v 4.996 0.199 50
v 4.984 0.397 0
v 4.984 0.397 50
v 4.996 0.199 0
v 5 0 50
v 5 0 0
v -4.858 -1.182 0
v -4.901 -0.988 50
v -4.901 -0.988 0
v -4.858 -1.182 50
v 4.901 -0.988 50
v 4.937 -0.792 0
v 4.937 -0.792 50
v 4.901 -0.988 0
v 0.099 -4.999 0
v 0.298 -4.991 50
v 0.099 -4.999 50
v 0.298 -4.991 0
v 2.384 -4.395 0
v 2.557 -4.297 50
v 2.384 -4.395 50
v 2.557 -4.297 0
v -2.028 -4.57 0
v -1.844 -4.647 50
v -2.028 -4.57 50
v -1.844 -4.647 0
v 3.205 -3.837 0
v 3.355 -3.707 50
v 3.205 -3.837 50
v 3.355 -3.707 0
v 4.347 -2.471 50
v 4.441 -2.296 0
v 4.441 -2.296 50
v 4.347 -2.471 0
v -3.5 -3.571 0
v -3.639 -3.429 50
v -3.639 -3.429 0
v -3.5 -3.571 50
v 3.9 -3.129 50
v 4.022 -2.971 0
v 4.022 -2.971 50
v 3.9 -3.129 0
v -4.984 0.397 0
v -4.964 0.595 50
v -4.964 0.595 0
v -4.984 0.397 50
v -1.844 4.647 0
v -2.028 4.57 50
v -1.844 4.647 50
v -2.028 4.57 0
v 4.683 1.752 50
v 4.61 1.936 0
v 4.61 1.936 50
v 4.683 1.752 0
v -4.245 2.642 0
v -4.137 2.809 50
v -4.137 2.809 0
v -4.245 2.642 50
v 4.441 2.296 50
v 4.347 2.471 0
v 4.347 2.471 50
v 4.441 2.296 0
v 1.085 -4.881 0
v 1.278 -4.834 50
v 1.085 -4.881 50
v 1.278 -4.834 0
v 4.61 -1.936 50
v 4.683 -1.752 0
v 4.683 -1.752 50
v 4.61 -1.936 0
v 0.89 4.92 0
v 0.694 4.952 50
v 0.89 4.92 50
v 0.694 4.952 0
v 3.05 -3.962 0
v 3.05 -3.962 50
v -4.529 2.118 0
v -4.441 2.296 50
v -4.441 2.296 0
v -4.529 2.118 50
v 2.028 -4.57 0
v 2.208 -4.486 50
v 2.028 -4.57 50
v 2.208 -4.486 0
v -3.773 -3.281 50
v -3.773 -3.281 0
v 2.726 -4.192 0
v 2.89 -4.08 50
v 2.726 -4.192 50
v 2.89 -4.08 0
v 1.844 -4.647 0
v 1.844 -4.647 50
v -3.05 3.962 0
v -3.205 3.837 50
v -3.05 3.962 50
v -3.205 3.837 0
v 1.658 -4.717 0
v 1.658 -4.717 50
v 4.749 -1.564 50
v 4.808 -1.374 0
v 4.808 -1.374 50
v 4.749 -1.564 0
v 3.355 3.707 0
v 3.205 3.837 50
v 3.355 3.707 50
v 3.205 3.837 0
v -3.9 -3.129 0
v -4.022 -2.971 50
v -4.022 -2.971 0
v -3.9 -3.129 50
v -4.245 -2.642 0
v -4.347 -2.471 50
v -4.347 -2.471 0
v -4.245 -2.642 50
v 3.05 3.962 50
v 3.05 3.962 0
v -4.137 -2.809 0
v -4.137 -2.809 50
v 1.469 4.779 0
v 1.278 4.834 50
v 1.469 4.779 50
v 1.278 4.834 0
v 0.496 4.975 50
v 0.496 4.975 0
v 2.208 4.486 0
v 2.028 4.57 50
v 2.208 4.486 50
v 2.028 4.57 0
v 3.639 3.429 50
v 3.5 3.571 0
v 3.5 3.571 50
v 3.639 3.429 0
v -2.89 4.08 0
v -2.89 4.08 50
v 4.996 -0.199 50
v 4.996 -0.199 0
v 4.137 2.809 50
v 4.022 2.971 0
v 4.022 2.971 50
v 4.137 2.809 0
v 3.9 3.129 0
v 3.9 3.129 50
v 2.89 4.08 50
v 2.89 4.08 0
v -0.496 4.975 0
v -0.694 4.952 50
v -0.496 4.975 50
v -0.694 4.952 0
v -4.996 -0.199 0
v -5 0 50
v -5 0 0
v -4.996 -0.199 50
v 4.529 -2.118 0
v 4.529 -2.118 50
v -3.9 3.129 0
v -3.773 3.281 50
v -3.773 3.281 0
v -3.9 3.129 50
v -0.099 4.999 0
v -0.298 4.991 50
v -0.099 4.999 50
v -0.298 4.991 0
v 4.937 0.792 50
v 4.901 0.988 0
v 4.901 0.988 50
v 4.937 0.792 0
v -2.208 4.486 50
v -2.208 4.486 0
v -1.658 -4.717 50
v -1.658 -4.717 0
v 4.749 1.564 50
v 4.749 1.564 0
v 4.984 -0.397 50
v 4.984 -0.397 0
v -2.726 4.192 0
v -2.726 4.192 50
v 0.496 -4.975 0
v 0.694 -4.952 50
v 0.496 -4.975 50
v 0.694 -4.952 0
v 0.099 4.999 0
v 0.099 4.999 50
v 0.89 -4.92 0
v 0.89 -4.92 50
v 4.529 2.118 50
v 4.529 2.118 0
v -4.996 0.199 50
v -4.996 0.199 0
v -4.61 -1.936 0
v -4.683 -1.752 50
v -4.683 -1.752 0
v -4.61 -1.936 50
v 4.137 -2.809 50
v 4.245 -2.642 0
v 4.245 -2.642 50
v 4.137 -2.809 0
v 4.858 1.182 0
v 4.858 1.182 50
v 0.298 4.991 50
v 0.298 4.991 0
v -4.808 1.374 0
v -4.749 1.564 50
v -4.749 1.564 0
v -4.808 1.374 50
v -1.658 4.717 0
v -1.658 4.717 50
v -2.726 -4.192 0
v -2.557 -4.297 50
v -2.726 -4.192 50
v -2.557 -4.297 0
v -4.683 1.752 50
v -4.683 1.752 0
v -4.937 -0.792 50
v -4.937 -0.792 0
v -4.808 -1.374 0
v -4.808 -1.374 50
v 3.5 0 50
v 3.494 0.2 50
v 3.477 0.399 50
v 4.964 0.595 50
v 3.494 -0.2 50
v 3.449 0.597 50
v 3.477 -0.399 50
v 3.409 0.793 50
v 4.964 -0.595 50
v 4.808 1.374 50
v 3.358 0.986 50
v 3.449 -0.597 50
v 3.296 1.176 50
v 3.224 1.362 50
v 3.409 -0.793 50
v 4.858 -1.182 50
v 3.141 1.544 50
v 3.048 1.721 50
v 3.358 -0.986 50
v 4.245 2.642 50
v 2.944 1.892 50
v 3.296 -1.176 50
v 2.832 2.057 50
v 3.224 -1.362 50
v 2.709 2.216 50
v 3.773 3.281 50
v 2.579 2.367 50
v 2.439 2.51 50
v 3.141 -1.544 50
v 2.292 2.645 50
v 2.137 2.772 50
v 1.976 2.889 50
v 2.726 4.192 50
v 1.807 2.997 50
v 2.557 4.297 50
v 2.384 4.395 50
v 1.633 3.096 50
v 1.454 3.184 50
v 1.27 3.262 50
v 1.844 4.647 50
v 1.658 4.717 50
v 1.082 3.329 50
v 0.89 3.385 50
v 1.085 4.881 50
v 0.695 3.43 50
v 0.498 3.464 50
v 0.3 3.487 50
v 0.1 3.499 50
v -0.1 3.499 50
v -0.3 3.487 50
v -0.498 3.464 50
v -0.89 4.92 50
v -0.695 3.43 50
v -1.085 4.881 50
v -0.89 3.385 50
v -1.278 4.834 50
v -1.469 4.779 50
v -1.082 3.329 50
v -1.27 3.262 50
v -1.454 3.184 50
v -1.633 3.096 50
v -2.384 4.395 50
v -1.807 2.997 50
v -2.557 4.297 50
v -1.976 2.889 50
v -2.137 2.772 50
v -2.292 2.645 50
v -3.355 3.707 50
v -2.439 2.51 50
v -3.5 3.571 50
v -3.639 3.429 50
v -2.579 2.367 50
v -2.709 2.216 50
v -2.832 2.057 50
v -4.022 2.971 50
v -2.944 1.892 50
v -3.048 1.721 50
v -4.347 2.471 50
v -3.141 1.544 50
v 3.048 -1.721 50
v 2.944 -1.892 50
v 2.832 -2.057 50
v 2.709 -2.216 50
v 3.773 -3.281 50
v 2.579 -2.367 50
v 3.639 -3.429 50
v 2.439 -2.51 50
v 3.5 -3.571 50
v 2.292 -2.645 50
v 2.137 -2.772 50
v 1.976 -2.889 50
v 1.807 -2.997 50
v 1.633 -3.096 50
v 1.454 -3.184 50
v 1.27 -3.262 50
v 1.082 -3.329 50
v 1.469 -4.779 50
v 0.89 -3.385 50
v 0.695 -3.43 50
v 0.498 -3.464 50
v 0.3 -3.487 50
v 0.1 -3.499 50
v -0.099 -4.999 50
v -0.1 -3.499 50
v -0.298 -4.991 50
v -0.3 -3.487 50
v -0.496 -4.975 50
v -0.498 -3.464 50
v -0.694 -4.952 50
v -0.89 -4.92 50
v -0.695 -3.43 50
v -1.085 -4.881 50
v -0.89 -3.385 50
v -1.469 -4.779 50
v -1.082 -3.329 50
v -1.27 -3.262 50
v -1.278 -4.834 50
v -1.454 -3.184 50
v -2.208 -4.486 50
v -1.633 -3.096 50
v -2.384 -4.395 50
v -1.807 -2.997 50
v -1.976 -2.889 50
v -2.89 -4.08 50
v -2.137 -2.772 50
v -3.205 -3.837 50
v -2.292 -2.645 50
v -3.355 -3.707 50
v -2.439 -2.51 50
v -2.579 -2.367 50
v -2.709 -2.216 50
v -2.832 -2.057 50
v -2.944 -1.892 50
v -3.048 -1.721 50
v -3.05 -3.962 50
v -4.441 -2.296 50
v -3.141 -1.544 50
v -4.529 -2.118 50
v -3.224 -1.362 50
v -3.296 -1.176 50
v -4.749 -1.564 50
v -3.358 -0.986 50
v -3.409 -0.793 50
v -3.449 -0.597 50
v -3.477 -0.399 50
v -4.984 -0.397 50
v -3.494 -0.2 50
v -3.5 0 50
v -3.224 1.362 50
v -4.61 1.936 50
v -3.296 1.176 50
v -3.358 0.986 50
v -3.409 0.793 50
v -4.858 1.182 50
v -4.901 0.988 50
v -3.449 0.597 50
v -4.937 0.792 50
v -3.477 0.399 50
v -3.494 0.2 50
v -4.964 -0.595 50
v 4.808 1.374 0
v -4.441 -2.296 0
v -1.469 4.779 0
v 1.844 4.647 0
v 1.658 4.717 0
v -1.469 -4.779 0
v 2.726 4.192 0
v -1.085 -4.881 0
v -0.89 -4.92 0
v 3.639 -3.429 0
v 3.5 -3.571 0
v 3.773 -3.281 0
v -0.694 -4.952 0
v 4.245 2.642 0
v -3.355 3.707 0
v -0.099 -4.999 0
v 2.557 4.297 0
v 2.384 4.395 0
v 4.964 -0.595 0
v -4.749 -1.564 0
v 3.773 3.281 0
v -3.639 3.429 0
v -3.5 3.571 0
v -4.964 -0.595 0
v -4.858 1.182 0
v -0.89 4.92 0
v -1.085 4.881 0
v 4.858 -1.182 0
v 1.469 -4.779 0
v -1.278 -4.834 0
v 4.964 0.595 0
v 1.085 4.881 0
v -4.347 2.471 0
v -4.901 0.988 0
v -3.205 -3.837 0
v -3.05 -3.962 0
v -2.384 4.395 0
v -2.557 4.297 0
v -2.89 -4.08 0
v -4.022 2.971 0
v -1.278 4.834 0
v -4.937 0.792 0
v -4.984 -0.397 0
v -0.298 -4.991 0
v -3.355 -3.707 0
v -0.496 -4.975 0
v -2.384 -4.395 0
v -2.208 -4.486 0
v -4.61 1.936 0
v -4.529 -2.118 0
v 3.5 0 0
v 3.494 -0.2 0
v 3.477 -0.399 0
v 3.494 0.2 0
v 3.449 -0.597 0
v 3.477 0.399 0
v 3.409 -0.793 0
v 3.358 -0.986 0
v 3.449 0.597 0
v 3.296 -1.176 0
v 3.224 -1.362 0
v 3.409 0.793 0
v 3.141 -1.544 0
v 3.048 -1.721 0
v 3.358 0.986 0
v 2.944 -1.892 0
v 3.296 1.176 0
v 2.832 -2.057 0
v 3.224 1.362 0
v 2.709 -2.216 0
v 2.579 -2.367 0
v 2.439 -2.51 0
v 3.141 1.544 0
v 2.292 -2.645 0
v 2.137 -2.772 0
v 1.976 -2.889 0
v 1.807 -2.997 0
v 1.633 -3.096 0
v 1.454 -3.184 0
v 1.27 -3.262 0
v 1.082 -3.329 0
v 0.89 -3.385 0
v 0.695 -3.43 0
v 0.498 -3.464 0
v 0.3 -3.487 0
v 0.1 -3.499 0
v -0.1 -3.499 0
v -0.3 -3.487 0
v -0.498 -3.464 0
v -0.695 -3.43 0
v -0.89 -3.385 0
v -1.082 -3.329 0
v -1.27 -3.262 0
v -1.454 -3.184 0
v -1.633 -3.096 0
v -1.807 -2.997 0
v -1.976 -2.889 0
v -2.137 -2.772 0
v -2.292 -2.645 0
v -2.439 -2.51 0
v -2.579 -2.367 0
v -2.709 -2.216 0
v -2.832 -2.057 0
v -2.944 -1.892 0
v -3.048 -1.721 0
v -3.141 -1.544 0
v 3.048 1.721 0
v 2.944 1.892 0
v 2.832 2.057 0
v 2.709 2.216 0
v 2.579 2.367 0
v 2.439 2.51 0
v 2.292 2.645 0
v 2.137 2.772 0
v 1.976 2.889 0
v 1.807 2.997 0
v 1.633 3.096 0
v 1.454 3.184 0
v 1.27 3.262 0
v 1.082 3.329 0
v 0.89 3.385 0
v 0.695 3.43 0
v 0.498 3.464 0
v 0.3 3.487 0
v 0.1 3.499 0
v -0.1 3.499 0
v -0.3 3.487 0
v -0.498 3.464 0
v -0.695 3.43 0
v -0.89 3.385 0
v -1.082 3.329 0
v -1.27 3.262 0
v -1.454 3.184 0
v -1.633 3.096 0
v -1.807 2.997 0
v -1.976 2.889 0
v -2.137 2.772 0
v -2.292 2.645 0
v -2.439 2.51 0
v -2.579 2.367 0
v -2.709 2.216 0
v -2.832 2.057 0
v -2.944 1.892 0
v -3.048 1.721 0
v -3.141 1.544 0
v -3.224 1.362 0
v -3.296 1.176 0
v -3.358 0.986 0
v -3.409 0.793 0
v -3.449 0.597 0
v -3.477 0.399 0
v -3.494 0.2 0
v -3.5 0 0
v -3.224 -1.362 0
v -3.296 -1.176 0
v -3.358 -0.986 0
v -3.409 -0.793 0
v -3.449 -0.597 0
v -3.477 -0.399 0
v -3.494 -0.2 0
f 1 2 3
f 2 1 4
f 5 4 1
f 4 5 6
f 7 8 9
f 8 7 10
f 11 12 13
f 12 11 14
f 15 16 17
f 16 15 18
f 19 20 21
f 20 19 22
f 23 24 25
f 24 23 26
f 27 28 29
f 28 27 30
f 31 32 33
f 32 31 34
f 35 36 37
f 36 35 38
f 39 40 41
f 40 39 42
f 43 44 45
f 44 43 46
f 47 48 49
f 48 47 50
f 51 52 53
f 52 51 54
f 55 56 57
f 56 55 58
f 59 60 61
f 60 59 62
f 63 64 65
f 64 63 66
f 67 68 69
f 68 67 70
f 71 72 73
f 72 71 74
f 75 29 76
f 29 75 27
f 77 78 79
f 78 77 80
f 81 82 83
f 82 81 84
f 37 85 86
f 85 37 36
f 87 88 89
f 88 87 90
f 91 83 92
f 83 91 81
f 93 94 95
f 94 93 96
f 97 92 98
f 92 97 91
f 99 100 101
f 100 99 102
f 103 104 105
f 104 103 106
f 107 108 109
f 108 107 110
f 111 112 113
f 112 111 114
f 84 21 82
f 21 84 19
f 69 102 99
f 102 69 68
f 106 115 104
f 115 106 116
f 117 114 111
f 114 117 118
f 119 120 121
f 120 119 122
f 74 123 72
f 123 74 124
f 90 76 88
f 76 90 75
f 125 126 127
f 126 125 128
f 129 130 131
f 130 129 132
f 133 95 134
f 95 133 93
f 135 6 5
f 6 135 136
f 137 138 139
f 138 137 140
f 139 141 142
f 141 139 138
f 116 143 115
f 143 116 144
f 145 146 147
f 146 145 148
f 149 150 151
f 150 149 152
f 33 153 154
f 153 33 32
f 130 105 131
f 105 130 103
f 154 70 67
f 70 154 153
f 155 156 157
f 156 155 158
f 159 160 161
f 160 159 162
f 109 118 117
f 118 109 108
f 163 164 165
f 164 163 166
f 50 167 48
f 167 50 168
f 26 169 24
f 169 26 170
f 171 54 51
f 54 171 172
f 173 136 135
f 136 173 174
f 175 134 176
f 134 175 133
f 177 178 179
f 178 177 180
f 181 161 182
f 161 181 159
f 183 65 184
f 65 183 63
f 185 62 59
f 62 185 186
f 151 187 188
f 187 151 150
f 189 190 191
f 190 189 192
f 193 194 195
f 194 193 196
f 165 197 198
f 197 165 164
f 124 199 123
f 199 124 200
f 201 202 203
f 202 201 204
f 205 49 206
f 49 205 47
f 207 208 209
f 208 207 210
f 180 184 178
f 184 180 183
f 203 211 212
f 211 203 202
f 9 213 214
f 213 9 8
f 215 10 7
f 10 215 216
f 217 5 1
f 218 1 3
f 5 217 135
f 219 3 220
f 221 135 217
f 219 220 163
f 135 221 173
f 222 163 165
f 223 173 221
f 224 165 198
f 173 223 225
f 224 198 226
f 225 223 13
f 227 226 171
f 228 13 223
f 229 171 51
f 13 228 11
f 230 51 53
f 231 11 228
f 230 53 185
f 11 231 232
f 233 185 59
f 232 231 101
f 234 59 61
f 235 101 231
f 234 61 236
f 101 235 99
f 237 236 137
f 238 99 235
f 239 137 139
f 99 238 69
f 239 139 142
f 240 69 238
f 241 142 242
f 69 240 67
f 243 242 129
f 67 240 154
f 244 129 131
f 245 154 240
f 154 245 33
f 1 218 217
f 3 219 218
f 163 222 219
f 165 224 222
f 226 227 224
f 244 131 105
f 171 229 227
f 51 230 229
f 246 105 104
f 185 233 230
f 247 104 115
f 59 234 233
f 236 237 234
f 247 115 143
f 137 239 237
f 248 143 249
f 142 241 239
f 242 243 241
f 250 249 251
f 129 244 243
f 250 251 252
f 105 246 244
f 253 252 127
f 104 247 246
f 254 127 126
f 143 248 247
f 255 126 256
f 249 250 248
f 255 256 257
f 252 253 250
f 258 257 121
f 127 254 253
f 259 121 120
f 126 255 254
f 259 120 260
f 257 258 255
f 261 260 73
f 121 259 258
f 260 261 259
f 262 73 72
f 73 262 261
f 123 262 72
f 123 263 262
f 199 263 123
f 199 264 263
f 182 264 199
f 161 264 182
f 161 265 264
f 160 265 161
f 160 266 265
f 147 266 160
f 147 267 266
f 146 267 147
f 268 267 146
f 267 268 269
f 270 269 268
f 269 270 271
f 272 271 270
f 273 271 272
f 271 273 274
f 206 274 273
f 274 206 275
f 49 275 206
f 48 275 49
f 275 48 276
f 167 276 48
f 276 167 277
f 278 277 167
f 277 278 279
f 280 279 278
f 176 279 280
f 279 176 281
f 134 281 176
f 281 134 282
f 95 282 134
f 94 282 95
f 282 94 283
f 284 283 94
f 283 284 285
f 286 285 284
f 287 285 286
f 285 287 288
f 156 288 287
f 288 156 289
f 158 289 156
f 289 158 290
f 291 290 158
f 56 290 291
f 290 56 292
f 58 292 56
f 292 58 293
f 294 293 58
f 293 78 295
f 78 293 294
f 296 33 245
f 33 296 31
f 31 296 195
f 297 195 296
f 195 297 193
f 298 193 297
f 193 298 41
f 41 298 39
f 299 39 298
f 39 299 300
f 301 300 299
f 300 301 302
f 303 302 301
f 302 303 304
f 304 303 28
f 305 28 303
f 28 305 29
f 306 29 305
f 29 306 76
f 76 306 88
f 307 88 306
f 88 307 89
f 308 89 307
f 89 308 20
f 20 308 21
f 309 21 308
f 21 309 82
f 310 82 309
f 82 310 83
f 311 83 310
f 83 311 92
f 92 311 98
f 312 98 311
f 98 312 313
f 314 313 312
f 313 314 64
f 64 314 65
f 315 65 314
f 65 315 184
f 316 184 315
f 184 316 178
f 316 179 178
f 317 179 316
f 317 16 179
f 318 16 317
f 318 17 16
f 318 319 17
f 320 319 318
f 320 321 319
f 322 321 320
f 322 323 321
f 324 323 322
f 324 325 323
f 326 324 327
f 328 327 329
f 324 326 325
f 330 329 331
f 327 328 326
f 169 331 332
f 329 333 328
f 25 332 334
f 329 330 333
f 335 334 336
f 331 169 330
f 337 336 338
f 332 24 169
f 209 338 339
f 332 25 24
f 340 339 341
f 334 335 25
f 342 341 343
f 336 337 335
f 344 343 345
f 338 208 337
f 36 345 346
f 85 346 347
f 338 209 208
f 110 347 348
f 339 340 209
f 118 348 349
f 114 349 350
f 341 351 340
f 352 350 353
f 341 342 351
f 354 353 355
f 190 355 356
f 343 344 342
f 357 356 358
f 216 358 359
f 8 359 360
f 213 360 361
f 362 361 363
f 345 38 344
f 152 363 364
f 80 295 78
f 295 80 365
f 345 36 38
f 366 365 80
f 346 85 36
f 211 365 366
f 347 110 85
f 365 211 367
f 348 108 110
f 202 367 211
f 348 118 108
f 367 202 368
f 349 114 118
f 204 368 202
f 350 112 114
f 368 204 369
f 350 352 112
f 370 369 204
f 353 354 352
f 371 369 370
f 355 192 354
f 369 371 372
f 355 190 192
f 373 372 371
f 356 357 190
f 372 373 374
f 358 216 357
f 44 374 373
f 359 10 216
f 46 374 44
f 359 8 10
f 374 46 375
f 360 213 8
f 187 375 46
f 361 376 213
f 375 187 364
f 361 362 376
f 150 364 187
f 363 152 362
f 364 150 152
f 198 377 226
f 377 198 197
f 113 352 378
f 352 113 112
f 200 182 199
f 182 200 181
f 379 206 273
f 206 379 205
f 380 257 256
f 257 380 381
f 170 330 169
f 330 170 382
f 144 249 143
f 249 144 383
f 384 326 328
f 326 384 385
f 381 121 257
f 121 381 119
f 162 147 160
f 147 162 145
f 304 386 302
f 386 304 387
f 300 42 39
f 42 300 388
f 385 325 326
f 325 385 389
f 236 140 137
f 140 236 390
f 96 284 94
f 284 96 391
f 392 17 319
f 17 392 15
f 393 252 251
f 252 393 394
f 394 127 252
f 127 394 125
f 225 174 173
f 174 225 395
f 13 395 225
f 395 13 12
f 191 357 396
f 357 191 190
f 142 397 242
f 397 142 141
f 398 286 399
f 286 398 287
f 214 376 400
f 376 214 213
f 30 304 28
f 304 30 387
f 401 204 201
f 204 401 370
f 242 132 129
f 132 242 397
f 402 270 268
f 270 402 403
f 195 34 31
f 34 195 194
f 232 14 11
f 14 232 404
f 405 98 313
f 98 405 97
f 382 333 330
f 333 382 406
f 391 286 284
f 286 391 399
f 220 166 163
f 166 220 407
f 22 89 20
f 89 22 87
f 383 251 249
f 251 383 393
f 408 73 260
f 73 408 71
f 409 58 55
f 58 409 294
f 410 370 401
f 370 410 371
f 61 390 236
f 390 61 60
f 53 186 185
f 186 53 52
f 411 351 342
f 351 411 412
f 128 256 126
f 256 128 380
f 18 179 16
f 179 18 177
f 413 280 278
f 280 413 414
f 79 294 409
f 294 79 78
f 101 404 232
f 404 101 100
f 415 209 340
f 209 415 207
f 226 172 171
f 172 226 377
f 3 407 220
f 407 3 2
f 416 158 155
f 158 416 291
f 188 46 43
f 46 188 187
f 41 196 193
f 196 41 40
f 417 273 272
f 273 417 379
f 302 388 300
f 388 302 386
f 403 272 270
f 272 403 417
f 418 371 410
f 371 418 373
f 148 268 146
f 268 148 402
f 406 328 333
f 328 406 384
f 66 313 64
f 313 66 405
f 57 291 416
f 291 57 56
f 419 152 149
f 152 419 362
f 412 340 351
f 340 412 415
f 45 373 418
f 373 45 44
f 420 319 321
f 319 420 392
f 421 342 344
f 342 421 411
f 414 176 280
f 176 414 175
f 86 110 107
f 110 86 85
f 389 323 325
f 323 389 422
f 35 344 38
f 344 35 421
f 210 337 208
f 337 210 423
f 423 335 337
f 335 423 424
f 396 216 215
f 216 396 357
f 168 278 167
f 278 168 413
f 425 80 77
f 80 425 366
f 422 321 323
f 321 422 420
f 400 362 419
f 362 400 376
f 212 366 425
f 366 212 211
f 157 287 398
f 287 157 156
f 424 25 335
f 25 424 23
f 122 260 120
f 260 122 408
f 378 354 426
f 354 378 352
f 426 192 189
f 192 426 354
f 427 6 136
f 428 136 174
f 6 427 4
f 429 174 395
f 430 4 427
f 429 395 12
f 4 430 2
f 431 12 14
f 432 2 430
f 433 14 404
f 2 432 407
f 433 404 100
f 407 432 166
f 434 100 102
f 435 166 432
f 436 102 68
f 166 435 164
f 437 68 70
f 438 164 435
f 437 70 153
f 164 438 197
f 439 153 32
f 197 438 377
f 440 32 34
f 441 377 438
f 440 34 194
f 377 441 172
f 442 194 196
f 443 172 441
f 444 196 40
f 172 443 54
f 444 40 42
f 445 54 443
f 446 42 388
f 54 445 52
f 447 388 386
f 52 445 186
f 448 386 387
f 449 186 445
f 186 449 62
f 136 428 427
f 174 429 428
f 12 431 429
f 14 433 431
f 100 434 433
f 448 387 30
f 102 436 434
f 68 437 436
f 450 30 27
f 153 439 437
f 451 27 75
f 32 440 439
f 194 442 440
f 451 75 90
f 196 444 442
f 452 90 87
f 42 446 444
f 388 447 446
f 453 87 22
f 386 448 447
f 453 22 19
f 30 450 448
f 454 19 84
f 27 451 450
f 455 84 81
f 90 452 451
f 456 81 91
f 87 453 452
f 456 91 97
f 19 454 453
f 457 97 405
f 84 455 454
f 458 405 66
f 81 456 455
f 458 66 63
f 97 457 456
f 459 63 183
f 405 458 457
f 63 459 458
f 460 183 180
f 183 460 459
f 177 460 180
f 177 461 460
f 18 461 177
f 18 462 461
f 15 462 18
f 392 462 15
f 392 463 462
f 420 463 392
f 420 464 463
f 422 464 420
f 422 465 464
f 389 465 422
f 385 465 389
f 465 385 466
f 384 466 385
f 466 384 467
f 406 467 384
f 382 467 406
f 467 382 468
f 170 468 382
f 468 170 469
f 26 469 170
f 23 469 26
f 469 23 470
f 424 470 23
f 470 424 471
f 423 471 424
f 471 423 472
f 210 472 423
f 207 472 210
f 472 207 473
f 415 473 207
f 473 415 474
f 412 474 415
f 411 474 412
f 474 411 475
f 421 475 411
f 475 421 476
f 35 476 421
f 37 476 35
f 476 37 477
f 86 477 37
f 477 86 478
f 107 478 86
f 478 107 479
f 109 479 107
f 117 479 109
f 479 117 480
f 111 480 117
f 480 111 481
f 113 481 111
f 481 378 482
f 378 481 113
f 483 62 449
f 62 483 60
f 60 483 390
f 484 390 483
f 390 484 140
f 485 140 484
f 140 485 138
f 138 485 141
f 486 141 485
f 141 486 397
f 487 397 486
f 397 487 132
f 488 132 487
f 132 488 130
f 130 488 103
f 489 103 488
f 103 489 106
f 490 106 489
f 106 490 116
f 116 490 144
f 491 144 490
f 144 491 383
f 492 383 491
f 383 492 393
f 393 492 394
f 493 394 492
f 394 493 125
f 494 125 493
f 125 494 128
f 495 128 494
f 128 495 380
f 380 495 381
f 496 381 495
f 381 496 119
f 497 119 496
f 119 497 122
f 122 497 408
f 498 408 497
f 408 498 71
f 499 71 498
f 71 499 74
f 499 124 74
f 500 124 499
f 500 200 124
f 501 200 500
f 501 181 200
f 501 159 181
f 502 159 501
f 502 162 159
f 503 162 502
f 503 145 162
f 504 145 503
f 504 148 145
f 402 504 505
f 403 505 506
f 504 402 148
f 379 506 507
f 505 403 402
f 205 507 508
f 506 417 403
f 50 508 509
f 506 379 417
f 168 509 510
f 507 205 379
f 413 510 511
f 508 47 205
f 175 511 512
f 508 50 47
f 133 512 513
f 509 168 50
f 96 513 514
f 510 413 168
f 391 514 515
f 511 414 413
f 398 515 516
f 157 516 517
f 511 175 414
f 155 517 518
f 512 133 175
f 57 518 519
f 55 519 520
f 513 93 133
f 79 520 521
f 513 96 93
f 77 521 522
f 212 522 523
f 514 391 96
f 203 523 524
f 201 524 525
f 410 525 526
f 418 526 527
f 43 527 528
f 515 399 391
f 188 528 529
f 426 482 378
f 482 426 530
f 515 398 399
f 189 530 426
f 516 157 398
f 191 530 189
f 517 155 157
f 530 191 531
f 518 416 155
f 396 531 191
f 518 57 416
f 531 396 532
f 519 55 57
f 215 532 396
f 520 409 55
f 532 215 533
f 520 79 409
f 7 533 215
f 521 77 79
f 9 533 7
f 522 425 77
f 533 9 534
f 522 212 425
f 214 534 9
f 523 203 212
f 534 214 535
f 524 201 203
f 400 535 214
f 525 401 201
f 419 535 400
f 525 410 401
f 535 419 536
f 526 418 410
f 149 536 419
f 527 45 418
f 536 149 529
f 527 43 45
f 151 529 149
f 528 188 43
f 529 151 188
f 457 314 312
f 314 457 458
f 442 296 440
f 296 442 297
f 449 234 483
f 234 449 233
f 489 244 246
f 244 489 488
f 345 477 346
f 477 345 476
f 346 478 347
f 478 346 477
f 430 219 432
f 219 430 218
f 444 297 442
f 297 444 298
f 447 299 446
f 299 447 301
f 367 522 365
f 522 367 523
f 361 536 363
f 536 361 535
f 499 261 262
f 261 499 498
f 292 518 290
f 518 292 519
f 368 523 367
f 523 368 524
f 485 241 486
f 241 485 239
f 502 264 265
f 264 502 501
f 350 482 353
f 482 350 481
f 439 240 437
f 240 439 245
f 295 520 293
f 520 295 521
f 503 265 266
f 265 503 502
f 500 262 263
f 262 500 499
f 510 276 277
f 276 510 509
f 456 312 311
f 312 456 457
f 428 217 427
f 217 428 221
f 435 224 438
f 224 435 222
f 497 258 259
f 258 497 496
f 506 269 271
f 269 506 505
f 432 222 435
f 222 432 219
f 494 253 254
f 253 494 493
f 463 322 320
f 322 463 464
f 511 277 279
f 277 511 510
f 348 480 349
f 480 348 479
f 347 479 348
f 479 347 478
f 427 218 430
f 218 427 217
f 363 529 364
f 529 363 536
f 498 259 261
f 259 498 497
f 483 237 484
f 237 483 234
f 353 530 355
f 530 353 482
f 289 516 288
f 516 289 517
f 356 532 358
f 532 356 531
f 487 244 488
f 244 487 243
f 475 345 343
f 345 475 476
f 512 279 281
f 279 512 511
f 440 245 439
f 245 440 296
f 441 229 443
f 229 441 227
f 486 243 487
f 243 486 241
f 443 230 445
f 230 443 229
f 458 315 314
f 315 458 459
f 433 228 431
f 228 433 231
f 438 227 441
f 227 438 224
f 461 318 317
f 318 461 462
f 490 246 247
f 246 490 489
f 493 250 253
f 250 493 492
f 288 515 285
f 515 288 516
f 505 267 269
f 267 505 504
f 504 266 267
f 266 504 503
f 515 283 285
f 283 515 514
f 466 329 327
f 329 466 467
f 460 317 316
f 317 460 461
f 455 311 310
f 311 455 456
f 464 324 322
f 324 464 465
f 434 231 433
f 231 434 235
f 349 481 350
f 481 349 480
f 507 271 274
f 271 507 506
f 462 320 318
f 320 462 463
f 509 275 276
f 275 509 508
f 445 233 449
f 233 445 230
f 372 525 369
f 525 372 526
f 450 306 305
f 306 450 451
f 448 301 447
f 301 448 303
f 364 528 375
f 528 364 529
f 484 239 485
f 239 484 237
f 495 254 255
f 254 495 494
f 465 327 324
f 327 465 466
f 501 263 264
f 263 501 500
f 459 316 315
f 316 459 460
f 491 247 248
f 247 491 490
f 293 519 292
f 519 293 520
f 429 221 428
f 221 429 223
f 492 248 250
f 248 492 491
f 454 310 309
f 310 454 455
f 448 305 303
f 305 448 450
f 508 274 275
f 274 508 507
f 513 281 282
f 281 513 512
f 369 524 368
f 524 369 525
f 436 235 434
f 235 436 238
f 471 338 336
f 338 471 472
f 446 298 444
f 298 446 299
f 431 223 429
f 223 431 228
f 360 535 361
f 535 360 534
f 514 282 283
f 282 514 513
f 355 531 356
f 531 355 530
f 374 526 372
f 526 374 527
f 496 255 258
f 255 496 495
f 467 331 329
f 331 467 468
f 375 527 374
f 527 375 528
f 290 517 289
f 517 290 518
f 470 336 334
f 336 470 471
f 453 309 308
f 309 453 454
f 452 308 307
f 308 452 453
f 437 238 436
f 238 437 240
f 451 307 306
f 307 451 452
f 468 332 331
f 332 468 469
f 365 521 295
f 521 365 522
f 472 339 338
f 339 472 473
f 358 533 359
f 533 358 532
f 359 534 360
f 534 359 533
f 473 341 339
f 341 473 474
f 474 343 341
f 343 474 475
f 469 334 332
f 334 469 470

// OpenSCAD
$fa = 1;
$fs = 0.2;

height = 50;

od = 10;
id = od - 2* 1.5;

difference() {
    cylinder(h = height, r = od/2);
    cylinder(h = height, r = id/2);
}
